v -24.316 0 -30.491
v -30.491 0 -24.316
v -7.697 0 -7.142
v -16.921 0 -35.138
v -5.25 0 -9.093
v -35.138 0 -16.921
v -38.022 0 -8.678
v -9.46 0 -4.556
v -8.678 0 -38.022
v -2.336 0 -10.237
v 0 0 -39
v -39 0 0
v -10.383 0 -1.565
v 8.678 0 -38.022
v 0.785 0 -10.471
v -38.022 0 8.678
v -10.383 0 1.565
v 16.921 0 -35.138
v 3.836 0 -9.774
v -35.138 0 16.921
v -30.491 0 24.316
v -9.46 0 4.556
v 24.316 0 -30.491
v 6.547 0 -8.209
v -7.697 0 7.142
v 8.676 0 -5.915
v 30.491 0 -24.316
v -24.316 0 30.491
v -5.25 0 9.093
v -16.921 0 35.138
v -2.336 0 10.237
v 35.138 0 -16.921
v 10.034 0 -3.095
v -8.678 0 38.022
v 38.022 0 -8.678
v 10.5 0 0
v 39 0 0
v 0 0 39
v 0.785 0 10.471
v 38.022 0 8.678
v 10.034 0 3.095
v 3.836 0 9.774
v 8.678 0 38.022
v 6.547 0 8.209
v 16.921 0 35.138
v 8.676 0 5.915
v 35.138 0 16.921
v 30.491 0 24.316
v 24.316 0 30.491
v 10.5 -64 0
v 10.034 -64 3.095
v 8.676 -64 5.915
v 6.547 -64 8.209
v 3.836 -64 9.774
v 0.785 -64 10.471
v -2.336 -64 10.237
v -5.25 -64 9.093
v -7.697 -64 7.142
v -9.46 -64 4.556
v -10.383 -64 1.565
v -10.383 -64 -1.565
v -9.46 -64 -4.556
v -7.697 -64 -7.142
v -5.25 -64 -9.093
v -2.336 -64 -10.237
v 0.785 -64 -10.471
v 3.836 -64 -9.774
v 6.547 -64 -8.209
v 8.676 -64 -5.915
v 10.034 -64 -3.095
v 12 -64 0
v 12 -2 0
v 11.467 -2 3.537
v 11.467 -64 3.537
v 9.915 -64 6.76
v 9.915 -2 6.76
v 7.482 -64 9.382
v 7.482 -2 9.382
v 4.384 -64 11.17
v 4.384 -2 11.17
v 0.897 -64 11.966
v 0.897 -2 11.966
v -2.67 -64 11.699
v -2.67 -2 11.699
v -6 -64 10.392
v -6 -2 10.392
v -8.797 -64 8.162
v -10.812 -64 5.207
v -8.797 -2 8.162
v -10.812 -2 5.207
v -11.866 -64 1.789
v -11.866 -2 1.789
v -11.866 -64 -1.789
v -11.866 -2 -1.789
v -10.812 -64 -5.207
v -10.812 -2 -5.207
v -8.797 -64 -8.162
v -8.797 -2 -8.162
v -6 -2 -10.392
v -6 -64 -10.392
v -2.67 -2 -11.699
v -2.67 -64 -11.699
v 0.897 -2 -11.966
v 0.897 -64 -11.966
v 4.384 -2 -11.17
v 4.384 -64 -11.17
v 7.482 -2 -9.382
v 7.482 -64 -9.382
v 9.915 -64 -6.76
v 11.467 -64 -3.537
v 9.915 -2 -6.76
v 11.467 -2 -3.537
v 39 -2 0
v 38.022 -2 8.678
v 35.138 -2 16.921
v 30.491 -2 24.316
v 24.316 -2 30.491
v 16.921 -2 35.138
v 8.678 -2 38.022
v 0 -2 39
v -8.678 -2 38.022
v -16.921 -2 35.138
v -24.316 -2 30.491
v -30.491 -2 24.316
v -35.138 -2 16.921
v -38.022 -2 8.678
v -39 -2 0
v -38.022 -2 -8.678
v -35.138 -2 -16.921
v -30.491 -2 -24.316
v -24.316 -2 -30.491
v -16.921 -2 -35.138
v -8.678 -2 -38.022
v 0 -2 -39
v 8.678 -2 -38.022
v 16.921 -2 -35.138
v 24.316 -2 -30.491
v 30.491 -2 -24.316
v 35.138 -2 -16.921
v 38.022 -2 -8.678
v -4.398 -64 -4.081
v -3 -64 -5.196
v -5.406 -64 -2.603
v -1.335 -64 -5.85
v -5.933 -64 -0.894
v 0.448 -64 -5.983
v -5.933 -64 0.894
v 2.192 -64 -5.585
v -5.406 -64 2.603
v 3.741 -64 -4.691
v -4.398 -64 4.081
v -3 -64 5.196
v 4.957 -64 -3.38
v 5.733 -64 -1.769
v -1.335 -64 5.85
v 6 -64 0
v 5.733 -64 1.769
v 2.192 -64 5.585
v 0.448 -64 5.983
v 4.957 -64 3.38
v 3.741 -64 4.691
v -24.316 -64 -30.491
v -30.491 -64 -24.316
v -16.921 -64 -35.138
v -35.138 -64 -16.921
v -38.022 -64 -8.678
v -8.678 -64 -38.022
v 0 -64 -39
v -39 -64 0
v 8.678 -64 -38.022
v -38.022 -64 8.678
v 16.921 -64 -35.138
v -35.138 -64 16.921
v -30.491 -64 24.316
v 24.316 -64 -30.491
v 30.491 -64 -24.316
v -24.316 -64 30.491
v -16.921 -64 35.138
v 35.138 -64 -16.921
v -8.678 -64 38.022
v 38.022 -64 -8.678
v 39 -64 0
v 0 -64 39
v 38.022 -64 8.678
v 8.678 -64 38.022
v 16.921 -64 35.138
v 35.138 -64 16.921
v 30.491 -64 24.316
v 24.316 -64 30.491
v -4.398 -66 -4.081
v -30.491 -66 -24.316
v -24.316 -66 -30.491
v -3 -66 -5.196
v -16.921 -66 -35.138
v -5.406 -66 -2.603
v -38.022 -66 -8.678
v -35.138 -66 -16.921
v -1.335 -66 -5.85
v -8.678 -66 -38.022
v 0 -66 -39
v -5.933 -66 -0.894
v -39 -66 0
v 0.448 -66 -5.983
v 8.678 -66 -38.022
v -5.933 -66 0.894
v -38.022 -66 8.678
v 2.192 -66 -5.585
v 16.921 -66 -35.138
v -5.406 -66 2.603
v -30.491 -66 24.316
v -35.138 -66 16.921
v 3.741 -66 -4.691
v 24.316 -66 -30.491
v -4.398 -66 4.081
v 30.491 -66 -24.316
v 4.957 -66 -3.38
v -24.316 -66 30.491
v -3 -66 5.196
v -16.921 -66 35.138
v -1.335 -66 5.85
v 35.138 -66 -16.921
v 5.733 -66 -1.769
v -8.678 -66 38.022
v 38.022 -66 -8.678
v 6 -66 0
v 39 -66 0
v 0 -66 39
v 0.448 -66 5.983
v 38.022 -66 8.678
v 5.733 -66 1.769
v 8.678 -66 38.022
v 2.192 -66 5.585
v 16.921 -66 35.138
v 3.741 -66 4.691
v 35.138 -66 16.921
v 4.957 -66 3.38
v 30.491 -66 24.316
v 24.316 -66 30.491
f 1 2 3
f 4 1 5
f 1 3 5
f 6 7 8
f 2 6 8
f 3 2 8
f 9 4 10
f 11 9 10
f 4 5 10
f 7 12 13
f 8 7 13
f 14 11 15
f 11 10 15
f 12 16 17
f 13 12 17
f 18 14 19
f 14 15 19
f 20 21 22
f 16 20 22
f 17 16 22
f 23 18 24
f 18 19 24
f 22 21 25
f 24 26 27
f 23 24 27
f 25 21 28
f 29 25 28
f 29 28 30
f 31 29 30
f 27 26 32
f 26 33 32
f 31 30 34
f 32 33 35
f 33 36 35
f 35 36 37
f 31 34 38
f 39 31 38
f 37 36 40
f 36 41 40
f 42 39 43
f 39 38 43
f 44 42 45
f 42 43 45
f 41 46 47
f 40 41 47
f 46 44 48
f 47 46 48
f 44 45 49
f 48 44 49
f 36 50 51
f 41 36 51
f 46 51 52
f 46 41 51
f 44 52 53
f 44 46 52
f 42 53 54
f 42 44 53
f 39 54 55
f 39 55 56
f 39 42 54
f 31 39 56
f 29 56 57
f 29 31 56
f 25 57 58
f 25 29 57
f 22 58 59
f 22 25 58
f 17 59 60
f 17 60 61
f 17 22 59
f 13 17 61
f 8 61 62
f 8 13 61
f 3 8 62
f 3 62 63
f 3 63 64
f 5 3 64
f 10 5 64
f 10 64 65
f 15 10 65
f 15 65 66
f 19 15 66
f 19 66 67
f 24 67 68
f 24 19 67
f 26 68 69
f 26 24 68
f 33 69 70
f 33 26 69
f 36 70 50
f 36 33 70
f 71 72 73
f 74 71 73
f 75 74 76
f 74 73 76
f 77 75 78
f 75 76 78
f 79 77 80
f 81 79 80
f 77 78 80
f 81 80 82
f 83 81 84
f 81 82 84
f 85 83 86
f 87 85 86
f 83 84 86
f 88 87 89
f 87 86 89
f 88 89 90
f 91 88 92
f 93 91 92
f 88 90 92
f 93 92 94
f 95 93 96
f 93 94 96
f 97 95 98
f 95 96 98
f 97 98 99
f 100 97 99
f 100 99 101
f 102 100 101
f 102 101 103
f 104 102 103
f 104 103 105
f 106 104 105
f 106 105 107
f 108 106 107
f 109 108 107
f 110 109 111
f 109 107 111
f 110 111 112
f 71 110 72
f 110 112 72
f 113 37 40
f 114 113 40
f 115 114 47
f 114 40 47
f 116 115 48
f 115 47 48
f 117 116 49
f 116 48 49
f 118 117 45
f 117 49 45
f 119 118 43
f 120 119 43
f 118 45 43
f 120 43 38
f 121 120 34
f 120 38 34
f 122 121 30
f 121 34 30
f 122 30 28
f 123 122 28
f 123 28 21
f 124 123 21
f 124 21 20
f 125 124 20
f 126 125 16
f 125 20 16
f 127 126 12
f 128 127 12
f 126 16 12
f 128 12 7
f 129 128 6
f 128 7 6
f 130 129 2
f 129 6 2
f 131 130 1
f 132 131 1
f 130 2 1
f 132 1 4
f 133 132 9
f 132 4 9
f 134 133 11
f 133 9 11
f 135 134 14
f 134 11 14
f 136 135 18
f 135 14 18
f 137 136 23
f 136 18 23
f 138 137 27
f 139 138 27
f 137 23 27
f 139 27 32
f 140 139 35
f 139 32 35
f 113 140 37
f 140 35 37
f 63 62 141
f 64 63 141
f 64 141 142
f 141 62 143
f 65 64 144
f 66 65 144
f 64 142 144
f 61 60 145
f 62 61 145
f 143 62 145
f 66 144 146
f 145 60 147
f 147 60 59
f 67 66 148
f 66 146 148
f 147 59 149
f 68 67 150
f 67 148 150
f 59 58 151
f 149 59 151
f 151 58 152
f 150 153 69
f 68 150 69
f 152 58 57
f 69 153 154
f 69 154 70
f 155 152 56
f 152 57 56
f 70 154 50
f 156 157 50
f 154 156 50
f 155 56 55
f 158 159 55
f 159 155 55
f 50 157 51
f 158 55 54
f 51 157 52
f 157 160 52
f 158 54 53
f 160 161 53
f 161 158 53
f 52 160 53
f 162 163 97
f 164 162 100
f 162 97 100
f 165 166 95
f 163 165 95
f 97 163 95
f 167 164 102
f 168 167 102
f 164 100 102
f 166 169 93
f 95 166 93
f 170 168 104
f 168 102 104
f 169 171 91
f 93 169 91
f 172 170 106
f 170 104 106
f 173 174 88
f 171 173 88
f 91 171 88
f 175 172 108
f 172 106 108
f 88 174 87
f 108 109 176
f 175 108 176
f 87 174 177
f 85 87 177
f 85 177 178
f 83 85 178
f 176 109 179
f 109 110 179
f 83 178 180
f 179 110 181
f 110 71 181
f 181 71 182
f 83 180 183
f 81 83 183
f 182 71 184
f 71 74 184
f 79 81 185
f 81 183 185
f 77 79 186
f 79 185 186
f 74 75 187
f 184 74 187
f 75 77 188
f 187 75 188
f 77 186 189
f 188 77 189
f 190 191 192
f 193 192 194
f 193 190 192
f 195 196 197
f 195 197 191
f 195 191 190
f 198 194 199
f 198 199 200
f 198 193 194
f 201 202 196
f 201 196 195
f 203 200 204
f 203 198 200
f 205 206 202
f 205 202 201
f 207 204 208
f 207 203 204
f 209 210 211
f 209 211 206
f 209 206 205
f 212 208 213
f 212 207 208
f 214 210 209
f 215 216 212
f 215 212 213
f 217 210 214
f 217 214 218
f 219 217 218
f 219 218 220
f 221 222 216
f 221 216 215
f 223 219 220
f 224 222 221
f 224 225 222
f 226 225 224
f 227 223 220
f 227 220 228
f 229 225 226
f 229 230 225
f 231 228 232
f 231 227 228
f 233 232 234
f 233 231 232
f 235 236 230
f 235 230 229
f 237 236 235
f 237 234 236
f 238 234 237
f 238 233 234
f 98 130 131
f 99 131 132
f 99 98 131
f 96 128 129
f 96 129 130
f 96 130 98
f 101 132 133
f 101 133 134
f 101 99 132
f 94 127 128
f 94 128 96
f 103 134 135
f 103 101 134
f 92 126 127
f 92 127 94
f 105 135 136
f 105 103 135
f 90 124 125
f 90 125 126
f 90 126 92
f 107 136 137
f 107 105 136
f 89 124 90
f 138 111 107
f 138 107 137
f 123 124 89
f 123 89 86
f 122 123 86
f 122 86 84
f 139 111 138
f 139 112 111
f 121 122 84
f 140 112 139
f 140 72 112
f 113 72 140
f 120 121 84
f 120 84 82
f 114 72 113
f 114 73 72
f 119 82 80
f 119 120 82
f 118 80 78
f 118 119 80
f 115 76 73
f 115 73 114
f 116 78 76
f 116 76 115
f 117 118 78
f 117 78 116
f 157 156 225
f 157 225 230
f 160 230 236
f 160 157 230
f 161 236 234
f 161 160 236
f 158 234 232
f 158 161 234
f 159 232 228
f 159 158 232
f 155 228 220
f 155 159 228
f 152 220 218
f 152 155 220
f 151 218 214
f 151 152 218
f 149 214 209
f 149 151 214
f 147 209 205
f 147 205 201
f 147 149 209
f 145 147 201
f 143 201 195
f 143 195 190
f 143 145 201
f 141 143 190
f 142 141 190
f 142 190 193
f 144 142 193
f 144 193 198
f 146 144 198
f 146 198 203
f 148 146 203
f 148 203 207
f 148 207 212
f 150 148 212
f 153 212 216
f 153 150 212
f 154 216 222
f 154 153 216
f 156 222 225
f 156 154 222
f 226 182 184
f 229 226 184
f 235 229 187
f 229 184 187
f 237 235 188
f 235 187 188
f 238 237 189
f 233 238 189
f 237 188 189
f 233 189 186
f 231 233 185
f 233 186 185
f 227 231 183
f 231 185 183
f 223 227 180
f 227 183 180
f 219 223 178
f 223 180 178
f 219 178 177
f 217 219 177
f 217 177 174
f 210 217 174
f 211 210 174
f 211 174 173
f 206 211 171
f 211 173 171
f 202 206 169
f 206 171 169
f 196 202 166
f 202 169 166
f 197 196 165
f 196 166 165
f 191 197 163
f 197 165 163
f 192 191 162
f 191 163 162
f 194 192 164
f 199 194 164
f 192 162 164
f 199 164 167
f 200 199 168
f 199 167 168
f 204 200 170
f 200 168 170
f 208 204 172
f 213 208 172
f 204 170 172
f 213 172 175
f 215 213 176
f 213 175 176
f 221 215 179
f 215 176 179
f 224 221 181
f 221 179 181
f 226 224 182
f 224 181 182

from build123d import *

# Parameters (mm, degrees)
F0_R     = 39
F0_R_2   = 10.5
F1_DEPTH = 2
F2_R     = 12
F2_R_2   = 10.5
F3_DEPTH = 62
F4_R     = 39
F4_R_2   = 6
F5_DEPTH = 2


with BuildPart() as f1:
    # F0 (on Front) → F1 (new body)
    with BuildSketch(Plane.XZ):
        Circle(F0_R)
        Circle(F0_R_2, mode=Mode.SUBTRACT)
    extrude(amount=F1_DEPTH)

    # F2 (on face) → F3 (join)
    with BuildSketch(Plane.XZ.offset(2)):
        Circle(F2_R)
        Circle(F2_R_2, mode=Mode.SUBTRACT)
    extrude(amount=F3_DEPTH)

    # F4 (on face) → F5 (join)
    with BuildSketch(Plane.XZ.offset(64)):
        Circle(F4_R)
        Circle(F4_R_2, mode=Mode.SUBTRACT)
    extrude(amount=F5_DEPTH)


solid = f1.part
